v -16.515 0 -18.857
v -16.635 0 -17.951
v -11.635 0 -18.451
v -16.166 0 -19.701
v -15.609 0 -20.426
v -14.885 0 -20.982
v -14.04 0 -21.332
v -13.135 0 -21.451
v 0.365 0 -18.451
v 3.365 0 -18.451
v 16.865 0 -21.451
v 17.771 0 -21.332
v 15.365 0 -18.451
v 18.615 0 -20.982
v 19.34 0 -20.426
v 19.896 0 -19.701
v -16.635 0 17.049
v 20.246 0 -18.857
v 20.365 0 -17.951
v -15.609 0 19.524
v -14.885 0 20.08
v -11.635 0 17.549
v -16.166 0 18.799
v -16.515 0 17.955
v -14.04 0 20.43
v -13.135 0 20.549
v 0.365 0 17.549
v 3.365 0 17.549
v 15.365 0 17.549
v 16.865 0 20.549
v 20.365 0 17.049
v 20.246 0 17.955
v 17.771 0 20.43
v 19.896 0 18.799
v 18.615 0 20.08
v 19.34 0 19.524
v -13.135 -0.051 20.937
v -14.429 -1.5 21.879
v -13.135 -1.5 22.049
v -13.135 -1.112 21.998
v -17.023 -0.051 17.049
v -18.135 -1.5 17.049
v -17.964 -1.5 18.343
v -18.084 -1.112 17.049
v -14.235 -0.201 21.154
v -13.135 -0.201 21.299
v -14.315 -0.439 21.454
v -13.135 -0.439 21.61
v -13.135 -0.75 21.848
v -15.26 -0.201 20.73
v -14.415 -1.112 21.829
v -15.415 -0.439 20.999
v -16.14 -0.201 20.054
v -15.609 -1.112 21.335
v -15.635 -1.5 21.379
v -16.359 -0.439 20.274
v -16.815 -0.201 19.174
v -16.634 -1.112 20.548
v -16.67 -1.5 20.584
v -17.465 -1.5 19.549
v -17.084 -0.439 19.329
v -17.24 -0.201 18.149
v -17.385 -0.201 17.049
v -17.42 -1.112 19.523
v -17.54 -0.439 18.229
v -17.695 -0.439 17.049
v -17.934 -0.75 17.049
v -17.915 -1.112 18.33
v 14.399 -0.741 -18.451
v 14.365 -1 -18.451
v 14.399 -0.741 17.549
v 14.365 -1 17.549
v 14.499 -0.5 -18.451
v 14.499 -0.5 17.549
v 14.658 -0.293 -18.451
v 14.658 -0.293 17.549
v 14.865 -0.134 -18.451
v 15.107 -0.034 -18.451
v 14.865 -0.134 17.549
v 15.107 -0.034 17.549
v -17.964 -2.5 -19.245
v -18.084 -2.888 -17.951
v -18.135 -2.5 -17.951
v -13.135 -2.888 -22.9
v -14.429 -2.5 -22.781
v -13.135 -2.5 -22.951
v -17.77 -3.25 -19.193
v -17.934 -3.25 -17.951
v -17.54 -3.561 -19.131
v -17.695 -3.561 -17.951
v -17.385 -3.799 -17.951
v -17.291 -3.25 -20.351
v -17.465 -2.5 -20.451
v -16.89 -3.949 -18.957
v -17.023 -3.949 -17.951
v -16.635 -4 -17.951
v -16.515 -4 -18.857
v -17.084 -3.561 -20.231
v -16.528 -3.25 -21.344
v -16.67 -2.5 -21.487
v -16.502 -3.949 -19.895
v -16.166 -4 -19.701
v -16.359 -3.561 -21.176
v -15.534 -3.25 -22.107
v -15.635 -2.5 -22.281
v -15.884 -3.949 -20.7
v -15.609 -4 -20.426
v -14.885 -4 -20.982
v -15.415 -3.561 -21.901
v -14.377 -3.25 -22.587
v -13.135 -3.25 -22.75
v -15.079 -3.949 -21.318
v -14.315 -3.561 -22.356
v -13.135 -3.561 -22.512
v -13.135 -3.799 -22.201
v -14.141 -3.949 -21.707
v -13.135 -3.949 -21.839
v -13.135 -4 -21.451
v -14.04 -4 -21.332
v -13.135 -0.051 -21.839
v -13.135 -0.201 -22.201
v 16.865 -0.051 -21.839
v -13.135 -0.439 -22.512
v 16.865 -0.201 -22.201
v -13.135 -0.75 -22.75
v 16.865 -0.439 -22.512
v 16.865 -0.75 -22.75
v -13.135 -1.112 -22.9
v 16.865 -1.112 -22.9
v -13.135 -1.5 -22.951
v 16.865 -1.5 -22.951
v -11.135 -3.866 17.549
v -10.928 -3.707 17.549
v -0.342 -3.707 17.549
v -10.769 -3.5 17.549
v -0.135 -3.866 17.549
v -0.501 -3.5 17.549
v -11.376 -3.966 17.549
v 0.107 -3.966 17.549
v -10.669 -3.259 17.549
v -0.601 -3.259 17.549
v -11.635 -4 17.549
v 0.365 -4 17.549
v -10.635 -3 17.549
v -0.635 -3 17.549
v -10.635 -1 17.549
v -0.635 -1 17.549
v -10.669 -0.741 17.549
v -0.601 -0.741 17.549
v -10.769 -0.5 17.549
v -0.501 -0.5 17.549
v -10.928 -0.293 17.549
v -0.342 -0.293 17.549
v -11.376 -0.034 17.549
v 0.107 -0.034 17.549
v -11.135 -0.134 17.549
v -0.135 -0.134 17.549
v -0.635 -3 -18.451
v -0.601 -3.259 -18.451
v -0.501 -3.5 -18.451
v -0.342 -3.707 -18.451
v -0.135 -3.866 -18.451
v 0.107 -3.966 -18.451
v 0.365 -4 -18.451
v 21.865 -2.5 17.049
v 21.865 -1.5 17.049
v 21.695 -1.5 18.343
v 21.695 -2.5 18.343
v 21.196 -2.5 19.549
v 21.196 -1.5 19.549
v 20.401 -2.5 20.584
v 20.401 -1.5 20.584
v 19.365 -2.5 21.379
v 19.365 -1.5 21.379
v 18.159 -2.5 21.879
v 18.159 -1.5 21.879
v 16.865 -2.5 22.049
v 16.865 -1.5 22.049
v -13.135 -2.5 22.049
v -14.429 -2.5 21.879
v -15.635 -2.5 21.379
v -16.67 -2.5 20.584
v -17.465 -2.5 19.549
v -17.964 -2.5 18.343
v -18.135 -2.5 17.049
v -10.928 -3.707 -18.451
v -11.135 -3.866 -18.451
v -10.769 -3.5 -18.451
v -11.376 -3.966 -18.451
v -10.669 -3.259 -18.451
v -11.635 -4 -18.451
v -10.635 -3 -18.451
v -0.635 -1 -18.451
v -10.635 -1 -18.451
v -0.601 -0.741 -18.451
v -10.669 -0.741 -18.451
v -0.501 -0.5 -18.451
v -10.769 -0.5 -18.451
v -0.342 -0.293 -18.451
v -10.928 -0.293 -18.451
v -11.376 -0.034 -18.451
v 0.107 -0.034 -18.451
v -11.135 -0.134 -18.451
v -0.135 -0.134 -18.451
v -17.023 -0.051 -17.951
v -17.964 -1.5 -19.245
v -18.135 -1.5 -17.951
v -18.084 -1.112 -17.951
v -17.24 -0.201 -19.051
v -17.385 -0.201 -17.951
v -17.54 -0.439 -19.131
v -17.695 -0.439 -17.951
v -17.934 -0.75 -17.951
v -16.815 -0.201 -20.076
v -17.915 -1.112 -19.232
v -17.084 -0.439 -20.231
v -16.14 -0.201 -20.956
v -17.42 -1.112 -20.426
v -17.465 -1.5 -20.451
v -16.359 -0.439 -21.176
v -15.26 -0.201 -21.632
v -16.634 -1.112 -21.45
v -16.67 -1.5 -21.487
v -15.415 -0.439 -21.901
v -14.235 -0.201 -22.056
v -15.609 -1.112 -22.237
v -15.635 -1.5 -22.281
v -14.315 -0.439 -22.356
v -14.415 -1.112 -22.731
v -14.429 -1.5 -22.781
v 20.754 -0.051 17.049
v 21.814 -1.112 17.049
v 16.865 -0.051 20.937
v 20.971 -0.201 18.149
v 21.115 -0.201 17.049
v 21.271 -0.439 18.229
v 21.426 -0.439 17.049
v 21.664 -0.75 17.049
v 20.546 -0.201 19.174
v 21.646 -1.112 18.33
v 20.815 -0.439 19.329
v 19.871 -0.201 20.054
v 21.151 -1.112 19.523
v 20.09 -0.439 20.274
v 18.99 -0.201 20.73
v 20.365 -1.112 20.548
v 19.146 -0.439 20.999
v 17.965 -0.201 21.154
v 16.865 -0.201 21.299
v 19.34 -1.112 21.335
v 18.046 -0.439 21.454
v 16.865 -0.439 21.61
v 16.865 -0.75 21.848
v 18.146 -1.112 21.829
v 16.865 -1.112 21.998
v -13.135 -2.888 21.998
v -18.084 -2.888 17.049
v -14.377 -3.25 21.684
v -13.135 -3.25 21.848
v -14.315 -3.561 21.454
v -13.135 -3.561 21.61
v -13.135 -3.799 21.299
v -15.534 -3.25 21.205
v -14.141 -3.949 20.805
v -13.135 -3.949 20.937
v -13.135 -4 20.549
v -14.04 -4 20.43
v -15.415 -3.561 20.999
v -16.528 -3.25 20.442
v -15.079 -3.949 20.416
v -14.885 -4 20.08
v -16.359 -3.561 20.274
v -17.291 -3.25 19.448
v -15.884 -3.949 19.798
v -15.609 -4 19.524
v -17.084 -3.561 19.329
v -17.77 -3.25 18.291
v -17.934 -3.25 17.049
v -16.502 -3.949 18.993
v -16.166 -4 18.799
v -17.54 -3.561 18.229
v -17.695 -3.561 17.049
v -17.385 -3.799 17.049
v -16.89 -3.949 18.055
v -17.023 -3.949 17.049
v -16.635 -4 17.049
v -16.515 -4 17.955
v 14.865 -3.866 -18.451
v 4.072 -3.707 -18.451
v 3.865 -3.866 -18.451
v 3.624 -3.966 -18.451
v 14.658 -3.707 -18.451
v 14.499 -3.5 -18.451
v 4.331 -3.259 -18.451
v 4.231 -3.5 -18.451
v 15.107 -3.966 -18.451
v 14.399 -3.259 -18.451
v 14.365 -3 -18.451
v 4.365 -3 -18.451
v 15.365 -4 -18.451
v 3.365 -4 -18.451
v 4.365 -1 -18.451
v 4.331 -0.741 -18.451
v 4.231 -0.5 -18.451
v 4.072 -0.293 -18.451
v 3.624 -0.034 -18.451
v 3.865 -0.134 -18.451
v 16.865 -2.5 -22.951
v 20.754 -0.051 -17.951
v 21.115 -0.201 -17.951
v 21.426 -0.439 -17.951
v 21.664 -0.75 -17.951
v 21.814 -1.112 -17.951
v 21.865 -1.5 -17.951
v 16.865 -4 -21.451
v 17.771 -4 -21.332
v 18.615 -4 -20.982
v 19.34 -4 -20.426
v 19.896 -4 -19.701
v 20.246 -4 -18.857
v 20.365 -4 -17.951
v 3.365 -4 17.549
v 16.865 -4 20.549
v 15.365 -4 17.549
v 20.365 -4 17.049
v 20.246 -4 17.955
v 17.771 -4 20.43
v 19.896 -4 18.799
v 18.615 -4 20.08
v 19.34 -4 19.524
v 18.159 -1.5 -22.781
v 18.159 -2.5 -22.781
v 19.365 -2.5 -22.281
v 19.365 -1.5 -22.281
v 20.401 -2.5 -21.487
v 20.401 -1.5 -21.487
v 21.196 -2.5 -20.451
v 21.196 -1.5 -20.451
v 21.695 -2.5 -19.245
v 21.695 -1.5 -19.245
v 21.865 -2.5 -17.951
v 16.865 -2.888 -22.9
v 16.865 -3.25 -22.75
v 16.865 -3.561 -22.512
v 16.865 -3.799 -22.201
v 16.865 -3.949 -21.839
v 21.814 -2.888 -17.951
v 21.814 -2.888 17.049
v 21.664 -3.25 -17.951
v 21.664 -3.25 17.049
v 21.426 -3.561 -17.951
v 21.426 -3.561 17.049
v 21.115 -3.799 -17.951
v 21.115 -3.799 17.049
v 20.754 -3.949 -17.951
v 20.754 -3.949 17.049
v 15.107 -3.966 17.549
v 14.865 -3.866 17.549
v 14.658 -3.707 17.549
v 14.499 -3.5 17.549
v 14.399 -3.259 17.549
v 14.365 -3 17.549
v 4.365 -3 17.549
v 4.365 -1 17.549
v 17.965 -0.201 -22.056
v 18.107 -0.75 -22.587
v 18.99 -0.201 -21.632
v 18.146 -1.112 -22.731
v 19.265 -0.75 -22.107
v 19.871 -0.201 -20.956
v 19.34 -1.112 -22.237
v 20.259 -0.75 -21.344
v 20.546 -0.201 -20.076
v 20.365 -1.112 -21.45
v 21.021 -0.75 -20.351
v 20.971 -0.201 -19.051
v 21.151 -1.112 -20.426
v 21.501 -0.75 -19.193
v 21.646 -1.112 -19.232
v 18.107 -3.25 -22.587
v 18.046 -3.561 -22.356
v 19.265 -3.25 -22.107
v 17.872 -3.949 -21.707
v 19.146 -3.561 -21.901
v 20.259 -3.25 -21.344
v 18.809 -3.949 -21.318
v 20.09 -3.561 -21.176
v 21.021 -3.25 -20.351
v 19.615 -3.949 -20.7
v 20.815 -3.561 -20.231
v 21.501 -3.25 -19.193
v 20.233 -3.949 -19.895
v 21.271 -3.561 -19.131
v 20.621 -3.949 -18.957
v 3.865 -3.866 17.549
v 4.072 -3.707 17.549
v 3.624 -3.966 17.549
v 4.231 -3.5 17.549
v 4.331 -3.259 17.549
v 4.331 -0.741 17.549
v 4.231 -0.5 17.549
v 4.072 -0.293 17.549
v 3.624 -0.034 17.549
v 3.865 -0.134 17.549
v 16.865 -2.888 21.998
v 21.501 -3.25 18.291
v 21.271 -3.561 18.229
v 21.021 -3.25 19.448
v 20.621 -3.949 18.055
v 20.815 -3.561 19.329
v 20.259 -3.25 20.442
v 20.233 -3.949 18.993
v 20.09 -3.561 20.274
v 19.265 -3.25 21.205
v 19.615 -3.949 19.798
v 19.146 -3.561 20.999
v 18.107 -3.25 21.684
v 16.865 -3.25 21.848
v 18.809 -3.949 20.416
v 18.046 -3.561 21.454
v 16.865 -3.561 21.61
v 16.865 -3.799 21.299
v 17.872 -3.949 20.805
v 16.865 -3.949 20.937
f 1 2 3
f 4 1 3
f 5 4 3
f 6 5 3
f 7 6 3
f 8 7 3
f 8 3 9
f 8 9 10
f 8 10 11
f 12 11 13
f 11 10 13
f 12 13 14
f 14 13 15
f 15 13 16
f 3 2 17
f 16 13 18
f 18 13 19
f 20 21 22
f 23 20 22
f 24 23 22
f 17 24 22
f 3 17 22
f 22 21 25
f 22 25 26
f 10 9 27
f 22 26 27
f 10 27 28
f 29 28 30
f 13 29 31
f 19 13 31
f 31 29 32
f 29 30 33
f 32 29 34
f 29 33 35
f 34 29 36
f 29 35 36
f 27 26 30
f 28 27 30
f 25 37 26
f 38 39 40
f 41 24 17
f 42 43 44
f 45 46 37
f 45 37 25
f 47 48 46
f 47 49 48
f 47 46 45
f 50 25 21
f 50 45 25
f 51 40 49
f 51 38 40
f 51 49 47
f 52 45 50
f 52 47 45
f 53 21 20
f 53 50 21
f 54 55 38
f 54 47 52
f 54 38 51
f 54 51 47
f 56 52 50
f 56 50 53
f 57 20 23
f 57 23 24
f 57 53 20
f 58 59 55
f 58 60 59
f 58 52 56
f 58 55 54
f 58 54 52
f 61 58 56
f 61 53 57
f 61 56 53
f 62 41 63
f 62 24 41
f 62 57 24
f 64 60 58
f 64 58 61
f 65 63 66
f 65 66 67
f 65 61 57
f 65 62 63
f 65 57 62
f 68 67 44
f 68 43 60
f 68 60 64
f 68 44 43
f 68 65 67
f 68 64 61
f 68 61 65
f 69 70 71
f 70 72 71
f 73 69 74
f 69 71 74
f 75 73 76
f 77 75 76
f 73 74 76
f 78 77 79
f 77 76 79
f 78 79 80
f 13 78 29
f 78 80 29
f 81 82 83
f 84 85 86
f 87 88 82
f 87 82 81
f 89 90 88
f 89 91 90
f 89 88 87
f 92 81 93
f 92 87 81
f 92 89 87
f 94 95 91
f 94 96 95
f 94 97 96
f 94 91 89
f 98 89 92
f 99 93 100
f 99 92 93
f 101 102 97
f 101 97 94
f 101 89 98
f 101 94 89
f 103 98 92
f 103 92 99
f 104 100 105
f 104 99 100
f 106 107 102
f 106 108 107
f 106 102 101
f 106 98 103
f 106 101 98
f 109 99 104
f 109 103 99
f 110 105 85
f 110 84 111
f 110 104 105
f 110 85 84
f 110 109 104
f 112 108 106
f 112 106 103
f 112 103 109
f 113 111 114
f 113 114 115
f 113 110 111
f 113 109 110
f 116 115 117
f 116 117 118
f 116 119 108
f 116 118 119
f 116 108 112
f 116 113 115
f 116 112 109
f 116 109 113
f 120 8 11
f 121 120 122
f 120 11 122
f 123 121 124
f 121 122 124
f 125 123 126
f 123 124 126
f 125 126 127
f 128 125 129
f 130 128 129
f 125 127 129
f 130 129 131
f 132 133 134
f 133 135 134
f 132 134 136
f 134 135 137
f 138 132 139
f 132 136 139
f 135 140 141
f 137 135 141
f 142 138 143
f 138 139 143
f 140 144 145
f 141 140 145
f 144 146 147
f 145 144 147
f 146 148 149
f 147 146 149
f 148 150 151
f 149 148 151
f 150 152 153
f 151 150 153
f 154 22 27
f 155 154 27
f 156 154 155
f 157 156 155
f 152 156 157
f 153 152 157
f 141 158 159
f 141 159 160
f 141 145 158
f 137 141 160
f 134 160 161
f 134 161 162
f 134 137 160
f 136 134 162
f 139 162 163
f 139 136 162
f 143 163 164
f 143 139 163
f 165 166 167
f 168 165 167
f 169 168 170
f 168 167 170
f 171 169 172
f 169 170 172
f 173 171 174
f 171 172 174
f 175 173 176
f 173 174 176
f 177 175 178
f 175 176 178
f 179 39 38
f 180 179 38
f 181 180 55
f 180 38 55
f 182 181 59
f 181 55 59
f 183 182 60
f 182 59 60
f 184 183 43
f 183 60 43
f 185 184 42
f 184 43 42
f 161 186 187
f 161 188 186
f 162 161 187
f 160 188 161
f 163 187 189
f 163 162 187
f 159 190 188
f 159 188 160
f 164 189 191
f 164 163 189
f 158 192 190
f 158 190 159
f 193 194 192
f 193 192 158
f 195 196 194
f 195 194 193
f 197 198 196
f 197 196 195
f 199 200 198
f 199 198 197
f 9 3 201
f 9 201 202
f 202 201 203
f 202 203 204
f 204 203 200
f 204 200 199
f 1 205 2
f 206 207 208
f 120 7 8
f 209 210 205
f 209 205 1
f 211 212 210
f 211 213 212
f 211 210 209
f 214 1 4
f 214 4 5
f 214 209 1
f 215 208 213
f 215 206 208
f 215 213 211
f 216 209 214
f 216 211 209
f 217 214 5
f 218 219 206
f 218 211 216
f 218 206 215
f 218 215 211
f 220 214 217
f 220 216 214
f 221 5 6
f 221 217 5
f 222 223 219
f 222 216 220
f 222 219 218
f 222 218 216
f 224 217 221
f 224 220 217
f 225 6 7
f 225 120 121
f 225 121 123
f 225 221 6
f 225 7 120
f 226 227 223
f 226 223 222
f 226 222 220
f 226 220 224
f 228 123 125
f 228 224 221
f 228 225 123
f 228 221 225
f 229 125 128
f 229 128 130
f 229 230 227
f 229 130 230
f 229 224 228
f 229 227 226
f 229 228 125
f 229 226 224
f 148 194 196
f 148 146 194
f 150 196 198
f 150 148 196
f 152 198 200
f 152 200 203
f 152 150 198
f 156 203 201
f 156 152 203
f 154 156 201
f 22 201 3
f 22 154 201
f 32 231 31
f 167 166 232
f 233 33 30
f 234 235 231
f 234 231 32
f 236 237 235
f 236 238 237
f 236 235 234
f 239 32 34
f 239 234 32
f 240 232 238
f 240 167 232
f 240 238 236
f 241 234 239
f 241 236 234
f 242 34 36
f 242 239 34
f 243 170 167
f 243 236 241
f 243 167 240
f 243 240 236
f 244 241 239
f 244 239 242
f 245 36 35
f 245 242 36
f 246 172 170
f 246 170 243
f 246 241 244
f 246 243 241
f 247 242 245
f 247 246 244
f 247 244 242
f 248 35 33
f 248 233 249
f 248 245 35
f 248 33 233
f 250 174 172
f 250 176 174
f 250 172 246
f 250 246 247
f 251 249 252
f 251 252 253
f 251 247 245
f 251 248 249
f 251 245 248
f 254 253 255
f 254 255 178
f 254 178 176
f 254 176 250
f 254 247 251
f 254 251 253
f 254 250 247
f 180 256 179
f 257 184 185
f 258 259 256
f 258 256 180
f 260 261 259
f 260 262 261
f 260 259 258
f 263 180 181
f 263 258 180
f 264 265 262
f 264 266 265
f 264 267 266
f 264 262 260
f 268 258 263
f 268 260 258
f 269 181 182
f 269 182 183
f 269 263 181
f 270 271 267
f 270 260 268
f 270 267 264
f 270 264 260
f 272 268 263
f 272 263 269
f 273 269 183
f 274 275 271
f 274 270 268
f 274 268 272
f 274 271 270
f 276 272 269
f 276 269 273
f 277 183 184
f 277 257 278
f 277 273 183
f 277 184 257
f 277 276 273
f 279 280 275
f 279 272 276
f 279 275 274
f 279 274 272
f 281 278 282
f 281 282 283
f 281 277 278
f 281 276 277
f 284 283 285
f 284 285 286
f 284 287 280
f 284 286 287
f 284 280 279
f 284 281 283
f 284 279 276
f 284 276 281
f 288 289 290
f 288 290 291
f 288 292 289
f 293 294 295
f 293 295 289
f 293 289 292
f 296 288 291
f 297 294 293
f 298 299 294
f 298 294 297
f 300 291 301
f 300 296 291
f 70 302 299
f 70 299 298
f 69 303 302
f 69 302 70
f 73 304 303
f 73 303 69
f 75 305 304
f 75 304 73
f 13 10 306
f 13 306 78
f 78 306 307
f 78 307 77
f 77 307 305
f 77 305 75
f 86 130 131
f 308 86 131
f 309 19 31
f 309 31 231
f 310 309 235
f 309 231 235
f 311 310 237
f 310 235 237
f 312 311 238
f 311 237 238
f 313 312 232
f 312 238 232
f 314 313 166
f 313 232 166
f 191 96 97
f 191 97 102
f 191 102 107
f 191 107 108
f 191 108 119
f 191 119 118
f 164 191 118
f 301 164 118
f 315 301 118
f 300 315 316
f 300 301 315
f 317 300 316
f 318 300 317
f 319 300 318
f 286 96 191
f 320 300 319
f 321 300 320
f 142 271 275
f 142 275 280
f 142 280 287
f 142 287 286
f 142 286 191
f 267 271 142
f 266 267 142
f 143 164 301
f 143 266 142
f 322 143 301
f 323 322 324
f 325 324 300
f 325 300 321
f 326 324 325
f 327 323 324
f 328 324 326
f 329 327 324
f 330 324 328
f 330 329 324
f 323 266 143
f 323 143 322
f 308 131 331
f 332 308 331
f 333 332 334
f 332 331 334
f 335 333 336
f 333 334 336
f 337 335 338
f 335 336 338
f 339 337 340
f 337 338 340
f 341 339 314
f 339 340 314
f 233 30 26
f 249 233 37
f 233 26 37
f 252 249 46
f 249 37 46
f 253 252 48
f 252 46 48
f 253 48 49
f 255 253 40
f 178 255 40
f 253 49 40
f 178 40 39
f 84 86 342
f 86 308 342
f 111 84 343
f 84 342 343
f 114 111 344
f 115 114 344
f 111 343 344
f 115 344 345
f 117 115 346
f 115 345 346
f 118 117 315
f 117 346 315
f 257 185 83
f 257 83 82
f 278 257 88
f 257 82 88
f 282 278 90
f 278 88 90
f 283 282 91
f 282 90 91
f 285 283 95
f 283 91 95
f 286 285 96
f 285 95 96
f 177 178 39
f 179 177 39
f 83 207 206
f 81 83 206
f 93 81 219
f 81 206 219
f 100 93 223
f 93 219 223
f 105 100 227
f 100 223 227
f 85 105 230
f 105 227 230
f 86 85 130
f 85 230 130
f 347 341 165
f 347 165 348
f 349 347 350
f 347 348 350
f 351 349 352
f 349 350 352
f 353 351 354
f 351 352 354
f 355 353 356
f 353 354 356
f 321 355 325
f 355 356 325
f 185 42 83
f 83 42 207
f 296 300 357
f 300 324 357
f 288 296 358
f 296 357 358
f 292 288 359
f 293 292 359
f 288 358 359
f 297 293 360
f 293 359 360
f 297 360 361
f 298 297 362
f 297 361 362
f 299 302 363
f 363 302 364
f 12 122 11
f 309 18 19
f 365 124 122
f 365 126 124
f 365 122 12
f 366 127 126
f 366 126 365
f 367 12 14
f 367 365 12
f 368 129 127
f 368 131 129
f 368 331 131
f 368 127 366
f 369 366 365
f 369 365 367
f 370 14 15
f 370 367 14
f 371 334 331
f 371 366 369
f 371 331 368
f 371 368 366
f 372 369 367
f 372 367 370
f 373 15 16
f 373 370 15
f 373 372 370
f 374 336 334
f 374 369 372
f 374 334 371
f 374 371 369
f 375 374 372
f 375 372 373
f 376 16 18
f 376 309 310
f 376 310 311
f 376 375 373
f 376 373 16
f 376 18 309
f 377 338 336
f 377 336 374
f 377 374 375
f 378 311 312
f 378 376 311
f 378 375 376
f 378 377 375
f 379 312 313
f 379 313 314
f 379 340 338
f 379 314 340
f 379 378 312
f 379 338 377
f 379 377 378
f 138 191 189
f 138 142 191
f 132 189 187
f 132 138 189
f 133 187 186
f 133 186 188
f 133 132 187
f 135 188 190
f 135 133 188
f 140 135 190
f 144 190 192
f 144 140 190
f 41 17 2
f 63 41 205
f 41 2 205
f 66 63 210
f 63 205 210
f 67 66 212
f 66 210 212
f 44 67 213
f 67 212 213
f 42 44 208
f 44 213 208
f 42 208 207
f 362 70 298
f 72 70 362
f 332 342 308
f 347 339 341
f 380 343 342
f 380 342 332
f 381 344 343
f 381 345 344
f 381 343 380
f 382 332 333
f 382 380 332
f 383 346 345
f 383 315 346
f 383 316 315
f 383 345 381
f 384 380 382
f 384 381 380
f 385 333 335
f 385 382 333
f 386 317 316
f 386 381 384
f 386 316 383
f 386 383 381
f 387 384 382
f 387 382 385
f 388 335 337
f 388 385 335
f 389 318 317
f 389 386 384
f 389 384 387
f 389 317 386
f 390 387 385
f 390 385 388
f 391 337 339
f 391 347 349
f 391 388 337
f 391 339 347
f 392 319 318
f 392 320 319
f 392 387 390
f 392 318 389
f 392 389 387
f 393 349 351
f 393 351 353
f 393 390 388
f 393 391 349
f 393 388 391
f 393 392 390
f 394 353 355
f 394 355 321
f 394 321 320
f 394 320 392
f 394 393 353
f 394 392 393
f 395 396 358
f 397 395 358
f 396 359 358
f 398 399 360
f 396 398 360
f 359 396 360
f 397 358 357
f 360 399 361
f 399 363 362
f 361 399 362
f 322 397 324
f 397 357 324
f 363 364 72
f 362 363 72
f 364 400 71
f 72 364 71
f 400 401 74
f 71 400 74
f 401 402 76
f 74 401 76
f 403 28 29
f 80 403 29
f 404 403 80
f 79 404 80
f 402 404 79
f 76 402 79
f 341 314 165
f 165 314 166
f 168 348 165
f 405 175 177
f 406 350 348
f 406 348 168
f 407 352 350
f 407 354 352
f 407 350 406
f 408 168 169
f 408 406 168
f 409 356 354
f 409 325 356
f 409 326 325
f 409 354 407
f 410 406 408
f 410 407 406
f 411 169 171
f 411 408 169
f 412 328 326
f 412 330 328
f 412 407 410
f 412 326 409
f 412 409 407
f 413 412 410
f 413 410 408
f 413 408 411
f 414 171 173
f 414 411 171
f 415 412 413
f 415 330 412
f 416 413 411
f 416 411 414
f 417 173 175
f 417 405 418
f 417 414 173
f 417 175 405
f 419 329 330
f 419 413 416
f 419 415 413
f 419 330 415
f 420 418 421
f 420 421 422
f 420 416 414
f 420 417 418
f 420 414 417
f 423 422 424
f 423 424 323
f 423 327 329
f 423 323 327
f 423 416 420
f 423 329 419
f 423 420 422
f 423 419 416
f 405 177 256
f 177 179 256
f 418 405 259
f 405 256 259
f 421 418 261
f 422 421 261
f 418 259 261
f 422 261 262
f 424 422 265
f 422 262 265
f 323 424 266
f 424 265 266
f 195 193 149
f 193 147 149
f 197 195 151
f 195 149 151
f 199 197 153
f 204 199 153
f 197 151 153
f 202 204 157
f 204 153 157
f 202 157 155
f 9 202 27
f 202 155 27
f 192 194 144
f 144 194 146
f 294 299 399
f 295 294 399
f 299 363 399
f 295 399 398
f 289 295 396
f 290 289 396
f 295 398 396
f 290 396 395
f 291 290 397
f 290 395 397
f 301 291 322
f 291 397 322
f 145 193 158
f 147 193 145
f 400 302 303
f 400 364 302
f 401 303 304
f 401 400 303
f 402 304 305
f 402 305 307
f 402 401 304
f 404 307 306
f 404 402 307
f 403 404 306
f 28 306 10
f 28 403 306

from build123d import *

# Parameters (mm, degrees)
F0_W     = 10
F0_H     = 36
F1_DEPTH = 4
F2_R     = 1
F3_R     = 1
F4_R     = 1.5


with BuildPart() as f1:
    # F0 (on Front) → F1 (new body)
    with BuildSketch(Plane.XZ):
        with BuildLine():
            ThreePointArc((-18.134615, -17.951065), (-16.670149, -21.486599), (-13.134615, -22.951065))
            Line((-13.134615, -22.951065), (16.865385, -22.951065))
            ThreePointArc((16.865385, -22.951065), (20.400919, -21.486599), (21.865385, -17.951065))
            Line((21.865385, -17.951065), (21.865385, 17.048935))
            ThreePointArc((21.865385, 17.048935), (20.400919, 20.584469), (16.865385, 22.048935))
            Line((16.865385, 22.048935), (-13.134615, 22.048935))
            ThreePointArc((-13.134615, 22.048935), (-16.670149, 20.584469), (-18.134615, 17.048935))
            Line((-18.134615, 17.048935), (-18.134615, -17.951065))
        make_face()
        with Locations((-5.634615, -0.451065)):
            Rectangle(F0_W, F0_H, mode=Mode.SUBTRACT)
        with Locations((9.365385, -0.451065)):
            Rectangle(F0_W, F0_H, mode=Mode.SUBTRACT)
    extrude(amount=F1_DEPTH)

    # F2
    f2_edges = [f1.edges().sort_by_distance(p)[0] for p in [
        (-0.634615, 0, -0.451065),
        (4.365385, 0, -0.451065),
        (4.365385, -4, -0.451065),
        (-0.634615, -4, -0.451065),
    ]]
    fillet(f2_edges, radius=F2_R)

    # F3
    f3_edges = [f1.edges().sort_by_distance(p)[0] for p in [
        (14.365385, -4, -0.451065),
        (14.365385, 0, -0.451065),
        (-10.634615, -4, -0.451065),
        (-10.634615, 0, -0.451065),
    ]]
    fillet(f3_edges, radius=F3_R)

    # F4
    f4_edges = [f1.edges().sort_by_distance(p)[0] for p in [
        (21.865385, -4, -0.451065),
        (21.865385, 0, -0.451065),
    ]]
    fillet(f4_edges, radius=F4_R)


solid = f1.part
